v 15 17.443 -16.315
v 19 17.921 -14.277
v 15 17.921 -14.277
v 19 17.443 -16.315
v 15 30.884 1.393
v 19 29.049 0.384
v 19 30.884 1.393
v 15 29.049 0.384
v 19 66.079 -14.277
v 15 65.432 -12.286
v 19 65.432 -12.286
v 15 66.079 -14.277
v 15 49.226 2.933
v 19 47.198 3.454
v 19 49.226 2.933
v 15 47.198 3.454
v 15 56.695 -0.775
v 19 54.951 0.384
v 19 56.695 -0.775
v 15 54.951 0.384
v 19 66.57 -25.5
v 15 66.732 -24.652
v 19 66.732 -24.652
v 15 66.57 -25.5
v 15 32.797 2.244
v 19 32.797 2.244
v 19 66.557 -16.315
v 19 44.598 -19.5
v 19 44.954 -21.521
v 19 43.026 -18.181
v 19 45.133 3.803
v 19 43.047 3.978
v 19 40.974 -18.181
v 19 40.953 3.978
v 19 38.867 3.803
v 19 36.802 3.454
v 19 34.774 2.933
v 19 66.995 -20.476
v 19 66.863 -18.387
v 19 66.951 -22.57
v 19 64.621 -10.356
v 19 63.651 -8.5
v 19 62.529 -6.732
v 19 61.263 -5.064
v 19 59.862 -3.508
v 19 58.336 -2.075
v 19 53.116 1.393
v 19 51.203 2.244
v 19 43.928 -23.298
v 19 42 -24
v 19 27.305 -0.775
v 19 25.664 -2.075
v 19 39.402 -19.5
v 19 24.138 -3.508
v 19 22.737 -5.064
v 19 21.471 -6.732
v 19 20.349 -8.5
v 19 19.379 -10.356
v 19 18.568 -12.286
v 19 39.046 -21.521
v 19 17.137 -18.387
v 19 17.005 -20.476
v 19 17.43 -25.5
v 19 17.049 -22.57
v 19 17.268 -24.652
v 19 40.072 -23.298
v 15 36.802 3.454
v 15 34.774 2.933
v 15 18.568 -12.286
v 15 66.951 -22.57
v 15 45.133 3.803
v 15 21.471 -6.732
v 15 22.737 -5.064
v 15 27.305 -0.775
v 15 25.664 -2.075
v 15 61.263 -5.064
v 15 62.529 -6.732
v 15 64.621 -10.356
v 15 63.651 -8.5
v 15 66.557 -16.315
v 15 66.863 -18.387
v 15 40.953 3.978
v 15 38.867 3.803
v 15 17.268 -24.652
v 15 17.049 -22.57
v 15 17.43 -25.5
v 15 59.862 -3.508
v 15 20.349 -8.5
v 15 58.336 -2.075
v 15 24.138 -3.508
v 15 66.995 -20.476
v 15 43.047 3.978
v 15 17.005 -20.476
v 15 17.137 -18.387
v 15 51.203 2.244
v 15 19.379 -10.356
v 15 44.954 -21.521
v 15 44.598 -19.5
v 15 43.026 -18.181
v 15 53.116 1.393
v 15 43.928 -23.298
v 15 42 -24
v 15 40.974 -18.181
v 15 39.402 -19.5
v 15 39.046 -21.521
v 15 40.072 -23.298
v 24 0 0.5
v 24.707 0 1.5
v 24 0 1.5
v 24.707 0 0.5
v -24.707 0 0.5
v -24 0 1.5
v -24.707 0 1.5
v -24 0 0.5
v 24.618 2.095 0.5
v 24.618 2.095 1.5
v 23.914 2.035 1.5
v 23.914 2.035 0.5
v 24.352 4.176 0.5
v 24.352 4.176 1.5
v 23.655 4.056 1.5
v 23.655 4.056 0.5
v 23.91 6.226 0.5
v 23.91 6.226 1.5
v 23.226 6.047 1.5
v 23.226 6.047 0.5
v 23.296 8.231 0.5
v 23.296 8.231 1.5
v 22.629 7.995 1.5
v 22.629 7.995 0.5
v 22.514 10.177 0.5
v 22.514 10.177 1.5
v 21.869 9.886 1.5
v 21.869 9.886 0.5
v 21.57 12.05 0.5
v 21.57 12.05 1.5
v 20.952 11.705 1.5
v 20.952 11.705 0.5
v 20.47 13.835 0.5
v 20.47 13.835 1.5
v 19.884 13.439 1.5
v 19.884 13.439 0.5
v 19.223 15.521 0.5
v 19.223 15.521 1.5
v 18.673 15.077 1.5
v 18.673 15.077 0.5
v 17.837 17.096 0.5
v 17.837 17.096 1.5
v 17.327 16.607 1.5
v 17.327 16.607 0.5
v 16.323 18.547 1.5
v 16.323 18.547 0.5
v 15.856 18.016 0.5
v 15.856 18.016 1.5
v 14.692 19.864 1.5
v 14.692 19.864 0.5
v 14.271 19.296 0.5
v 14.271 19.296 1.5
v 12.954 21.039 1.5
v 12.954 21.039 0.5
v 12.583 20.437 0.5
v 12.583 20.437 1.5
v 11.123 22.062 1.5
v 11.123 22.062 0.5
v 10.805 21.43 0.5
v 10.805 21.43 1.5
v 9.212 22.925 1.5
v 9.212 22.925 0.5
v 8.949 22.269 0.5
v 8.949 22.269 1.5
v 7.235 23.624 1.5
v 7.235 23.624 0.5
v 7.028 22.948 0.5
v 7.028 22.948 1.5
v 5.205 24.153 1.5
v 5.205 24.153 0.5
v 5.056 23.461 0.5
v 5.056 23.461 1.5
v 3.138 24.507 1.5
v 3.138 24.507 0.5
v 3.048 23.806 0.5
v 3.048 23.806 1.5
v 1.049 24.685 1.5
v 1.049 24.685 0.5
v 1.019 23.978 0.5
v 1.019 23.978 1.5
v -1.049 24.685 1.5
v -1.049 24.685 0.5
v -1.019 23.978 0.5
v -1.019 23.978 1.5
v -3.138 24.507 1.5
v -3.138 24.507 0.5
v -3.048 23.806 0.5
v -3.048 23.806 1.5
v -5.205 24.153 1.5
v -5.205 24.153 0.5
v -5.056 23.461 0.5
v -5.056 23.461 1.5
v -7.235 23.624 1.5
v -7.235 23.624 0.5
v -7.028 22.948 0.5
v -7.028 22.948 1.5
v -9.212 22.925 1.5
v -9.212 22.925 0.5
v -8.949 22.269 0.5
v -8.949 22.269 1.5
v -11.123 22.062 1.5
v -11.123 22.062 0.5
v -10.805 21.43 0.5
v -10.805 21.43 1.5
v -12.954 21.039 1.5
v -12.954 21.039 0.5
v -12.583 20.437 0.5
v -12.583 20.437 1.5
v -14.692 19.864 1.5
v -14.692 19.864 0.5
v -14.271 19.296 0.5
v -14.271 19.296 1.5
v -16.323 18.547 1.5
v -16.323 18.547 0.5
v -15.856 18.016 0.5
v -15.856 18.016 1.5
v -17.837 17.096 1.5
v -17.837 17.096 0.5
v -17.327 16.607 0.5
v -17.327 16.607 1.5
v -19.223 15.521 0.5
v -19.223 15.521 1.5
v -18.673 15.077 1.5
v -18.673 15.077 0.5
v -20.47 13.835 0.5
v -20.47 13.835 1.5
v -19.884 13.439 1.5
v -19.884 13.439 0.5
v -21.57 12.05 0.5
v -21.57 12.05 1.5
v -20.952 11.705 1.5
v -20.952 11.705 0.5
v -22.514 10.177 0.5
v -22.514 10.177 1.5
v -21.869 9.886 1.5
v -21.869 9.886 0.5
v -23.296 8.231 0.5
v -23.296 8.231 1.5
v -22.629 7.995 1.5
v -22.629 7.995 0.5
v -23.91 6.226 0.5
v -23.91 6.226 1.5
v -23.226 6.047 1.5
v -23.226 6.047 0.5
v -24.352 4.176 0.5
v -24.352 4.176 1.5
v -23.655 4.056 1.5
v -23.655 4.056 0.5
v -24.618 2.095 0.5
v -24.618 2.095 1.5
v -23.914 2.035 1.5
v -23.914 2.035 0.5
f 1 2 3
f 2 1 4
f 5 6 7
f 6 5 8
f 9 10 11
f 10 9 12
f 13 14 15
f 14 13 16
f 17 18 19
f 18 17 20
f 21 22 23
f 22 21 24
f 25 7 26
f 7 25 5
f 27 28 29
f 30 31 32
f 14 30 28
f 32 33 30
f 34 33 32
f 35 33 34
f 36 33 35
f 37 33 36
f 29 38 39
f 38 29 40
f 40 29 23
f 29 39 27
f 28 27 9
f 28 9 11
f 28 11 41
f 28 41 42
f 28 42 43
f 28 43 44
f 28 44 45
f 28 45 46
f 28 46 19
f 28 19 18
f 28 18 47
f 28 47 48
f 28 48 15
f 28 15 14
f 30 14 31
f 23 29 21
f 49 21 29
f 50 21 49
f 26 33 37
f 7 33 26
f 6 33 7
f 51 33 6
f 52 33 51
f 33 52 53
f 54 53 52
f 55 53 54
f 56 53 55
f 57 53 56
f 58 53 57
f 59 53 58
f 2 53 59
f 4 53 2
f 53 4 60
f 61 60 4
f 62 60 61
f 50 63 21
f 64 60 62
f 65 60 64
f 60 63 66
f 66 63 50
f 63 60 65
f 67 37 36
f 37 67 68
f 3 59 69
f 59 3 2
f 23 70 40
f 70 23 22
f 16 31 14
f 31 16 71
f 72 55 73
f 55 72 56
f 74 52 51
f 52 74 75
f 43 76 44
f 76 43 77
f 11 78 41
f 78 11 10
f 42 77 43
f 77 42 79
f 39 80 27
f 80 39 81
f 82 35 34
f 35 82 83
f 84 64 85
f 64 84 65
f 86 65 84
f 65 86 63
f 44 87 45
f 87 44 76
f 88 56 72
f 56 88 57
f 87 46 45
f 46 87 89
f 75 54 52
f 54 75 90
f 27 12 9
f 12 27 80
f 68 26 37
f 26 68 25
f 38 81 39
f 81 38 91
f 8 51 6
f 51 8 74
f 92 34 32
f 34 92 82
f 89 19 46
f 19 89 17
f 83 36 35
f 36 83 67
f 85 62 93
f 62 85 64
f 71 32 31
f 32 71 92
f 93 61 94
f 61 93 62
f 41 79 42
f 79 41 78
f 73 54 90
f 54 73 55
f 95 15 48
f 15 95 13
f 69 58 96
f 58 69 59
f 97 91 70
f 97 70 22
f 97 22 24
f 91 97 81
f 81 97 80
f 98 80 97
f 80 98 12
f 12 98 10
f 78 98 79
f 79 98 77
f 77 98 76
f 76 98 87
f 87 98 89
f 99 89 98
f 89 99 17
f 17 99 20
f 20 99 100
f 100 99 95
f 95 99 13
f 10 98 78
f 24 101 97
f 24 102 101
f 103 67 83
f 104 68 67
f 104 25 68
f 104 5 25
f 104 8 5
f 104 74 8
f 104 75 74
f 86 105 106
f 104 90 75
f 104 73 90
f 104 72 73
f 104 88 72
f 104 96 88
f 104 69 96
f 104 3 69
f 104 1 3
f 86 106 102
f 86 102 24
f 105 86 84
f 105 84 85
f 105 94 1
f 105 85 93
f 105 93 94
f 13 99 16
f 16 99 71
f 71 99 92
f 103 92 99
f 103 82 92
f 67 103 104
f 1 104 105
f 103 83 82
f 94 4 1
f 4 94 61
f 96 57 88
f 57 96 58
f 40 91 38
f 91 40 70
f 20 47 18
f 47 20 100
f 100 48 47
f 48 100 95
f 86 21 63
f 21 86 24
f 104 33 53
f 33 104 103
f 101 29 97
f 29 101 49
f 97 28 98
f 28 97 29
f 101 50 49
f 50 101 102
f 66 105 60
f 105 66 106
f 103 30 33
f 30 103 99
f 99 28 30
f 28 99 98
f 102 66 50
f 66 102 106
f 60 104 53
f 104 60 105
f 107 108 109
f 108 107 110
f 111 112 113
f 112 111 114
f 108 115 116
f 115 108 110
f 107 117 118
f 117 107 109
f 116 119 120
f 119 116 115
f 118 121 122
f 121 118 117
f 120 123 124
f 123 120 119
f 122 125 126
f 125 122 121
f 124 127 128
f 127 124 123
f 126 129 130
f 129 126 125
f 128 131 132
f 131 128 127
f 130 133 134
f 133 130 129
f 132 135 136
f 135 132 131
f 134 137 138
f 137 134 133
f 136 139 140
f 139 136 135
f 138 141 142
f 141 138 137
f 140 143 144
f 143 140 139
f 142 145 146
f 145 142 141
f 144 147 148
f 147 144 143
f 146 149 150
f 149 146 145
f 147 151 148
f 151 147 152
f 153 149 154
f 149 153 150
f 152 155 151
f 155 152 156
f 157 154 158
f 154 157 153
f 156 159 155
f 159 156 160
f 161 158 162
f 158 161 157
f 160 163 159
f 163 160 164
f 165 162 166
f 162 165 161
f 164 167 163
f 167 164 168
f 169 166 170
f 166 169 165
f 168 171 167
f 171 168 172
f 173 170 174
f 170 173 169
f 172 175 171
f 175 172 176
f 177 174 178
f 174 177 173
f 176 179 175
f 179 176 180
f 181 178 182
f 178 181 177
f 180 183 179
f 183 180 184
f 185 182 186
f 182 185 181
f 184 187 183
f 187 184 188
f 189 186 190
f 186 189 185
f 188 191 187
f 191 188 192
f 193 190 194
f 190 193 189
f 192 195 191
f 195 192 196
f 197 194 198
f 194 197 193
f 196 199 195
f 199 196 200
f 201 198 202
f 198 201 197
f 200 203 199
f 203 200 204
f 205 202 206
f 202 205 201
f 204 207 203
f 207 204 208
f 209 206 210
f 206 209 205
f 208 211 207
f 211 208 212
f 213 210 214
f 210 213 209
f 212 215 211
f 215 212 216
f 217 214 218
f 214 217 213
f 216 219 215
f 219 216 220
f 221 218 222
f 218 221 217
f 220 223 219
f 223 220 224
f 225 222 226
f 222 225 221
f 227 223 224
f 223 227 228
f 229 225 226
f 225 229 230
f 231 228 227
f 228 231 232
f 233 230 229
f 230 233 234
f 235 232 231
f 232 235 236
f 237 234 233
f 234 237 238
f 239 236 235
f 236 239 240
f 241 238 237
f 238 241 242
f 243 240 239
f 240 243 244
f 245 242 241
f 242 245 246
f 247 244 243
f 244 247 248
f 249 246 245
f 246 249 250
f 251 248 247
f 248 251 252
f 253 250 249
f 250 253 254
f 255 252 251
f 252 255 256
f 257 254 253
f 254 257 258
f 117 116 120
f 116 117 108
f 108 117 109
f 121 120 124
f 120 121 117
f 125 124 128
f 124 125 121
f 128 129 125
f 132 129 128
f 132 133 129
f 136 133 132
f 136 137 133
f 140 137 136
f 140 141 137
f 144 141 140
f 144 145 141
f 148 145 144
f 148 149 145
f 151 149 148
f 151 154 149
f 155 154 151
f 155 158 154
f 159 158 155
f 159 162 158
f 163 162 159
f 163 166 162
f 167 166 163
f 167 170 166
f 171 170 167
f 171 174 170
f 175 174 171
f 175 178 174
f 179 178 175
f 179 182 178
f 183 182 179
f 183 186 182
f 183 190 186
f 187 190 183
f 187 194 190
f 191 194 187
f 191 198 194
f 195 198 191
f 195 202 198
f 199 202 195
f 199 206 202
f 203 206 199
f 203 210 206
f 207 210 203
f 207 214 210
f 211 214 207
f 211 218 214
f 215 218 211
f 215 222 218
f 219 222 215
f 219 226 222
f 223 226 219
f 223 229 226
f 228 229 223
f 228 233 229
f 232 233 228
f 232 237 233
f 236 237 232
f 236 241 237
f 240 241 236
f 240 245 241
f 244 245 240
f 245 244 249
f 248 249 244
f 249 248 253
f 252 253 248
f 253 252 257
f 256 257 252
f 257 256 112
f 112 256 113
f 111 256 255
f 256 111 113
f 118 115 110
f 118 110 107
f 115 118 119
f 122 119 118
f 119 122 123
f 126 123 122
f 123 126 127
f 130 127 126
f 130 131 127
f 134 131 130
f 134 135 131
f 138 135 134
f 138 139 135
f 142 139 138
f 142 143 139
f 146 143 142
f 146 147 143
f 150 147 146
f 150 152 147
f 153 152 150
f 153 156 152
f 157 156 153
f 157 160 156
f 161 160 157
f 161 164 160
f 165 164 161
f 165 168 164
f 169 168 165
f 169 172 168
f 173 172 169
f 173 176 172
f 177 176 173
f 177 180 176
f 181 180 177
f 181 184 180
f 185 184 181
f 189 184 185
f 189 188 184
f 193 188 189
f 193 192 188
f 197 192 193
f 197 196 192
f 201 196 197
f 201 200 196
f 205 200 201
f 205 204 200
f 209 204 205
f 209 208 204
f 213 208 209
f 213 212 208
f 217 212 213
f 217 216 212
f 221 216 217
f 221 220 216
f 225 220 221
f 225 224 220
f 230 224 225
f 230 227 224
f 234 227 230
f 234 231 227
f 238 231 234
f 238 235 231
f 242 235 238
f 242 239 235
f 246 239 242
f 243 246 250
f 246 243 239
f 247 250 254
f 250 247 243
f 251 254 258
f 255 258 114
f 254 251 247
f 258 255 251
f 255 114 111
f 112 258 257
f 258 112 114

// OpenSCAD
//difference() {
 //   linear_extrude( height = 1.5, center = true, convexity = 10) import("pe-microsynthv3.dxf");

//    rotate( 90, [0, 1, 0]) translate([21,42,19]) cylinder(h=6, r=27, center = true);
//}
$fa = 1;
$fs = 2.1;
//linear_extrude( height = 1.5, center = true, convexity = 10) import("pe-microsynthv3.dxf");

pot_shaft_radius = 3;
mod_wheel_radius = 25;
mod_wheel_width = 4;

//rotate( 90, [0, 1, 0]) translate([21,42,17.5]) cylinder(h=6, r=27, center = true);

difference() {
  rotate([0, 90, 0]) translate([21,42,17]) difference() {
    cylinder(h=mod_wheel_width, r=mod_wheel_radius, center=true);
    translate([17,0,0]) cube([25,50,5], center = true);
  }
  rotate( 90, [0, 1, 0]) translate([21,42,17]) cylinder(h=16, r= pot_shaft_radius, center = true);
}

rotate_extrude(height = 1.5, angle = 180)
//union(){
//  square([25,2]);
  translate([24,0.5,0.5]) rotate([0,45,0]) square([1,1]);
//}
